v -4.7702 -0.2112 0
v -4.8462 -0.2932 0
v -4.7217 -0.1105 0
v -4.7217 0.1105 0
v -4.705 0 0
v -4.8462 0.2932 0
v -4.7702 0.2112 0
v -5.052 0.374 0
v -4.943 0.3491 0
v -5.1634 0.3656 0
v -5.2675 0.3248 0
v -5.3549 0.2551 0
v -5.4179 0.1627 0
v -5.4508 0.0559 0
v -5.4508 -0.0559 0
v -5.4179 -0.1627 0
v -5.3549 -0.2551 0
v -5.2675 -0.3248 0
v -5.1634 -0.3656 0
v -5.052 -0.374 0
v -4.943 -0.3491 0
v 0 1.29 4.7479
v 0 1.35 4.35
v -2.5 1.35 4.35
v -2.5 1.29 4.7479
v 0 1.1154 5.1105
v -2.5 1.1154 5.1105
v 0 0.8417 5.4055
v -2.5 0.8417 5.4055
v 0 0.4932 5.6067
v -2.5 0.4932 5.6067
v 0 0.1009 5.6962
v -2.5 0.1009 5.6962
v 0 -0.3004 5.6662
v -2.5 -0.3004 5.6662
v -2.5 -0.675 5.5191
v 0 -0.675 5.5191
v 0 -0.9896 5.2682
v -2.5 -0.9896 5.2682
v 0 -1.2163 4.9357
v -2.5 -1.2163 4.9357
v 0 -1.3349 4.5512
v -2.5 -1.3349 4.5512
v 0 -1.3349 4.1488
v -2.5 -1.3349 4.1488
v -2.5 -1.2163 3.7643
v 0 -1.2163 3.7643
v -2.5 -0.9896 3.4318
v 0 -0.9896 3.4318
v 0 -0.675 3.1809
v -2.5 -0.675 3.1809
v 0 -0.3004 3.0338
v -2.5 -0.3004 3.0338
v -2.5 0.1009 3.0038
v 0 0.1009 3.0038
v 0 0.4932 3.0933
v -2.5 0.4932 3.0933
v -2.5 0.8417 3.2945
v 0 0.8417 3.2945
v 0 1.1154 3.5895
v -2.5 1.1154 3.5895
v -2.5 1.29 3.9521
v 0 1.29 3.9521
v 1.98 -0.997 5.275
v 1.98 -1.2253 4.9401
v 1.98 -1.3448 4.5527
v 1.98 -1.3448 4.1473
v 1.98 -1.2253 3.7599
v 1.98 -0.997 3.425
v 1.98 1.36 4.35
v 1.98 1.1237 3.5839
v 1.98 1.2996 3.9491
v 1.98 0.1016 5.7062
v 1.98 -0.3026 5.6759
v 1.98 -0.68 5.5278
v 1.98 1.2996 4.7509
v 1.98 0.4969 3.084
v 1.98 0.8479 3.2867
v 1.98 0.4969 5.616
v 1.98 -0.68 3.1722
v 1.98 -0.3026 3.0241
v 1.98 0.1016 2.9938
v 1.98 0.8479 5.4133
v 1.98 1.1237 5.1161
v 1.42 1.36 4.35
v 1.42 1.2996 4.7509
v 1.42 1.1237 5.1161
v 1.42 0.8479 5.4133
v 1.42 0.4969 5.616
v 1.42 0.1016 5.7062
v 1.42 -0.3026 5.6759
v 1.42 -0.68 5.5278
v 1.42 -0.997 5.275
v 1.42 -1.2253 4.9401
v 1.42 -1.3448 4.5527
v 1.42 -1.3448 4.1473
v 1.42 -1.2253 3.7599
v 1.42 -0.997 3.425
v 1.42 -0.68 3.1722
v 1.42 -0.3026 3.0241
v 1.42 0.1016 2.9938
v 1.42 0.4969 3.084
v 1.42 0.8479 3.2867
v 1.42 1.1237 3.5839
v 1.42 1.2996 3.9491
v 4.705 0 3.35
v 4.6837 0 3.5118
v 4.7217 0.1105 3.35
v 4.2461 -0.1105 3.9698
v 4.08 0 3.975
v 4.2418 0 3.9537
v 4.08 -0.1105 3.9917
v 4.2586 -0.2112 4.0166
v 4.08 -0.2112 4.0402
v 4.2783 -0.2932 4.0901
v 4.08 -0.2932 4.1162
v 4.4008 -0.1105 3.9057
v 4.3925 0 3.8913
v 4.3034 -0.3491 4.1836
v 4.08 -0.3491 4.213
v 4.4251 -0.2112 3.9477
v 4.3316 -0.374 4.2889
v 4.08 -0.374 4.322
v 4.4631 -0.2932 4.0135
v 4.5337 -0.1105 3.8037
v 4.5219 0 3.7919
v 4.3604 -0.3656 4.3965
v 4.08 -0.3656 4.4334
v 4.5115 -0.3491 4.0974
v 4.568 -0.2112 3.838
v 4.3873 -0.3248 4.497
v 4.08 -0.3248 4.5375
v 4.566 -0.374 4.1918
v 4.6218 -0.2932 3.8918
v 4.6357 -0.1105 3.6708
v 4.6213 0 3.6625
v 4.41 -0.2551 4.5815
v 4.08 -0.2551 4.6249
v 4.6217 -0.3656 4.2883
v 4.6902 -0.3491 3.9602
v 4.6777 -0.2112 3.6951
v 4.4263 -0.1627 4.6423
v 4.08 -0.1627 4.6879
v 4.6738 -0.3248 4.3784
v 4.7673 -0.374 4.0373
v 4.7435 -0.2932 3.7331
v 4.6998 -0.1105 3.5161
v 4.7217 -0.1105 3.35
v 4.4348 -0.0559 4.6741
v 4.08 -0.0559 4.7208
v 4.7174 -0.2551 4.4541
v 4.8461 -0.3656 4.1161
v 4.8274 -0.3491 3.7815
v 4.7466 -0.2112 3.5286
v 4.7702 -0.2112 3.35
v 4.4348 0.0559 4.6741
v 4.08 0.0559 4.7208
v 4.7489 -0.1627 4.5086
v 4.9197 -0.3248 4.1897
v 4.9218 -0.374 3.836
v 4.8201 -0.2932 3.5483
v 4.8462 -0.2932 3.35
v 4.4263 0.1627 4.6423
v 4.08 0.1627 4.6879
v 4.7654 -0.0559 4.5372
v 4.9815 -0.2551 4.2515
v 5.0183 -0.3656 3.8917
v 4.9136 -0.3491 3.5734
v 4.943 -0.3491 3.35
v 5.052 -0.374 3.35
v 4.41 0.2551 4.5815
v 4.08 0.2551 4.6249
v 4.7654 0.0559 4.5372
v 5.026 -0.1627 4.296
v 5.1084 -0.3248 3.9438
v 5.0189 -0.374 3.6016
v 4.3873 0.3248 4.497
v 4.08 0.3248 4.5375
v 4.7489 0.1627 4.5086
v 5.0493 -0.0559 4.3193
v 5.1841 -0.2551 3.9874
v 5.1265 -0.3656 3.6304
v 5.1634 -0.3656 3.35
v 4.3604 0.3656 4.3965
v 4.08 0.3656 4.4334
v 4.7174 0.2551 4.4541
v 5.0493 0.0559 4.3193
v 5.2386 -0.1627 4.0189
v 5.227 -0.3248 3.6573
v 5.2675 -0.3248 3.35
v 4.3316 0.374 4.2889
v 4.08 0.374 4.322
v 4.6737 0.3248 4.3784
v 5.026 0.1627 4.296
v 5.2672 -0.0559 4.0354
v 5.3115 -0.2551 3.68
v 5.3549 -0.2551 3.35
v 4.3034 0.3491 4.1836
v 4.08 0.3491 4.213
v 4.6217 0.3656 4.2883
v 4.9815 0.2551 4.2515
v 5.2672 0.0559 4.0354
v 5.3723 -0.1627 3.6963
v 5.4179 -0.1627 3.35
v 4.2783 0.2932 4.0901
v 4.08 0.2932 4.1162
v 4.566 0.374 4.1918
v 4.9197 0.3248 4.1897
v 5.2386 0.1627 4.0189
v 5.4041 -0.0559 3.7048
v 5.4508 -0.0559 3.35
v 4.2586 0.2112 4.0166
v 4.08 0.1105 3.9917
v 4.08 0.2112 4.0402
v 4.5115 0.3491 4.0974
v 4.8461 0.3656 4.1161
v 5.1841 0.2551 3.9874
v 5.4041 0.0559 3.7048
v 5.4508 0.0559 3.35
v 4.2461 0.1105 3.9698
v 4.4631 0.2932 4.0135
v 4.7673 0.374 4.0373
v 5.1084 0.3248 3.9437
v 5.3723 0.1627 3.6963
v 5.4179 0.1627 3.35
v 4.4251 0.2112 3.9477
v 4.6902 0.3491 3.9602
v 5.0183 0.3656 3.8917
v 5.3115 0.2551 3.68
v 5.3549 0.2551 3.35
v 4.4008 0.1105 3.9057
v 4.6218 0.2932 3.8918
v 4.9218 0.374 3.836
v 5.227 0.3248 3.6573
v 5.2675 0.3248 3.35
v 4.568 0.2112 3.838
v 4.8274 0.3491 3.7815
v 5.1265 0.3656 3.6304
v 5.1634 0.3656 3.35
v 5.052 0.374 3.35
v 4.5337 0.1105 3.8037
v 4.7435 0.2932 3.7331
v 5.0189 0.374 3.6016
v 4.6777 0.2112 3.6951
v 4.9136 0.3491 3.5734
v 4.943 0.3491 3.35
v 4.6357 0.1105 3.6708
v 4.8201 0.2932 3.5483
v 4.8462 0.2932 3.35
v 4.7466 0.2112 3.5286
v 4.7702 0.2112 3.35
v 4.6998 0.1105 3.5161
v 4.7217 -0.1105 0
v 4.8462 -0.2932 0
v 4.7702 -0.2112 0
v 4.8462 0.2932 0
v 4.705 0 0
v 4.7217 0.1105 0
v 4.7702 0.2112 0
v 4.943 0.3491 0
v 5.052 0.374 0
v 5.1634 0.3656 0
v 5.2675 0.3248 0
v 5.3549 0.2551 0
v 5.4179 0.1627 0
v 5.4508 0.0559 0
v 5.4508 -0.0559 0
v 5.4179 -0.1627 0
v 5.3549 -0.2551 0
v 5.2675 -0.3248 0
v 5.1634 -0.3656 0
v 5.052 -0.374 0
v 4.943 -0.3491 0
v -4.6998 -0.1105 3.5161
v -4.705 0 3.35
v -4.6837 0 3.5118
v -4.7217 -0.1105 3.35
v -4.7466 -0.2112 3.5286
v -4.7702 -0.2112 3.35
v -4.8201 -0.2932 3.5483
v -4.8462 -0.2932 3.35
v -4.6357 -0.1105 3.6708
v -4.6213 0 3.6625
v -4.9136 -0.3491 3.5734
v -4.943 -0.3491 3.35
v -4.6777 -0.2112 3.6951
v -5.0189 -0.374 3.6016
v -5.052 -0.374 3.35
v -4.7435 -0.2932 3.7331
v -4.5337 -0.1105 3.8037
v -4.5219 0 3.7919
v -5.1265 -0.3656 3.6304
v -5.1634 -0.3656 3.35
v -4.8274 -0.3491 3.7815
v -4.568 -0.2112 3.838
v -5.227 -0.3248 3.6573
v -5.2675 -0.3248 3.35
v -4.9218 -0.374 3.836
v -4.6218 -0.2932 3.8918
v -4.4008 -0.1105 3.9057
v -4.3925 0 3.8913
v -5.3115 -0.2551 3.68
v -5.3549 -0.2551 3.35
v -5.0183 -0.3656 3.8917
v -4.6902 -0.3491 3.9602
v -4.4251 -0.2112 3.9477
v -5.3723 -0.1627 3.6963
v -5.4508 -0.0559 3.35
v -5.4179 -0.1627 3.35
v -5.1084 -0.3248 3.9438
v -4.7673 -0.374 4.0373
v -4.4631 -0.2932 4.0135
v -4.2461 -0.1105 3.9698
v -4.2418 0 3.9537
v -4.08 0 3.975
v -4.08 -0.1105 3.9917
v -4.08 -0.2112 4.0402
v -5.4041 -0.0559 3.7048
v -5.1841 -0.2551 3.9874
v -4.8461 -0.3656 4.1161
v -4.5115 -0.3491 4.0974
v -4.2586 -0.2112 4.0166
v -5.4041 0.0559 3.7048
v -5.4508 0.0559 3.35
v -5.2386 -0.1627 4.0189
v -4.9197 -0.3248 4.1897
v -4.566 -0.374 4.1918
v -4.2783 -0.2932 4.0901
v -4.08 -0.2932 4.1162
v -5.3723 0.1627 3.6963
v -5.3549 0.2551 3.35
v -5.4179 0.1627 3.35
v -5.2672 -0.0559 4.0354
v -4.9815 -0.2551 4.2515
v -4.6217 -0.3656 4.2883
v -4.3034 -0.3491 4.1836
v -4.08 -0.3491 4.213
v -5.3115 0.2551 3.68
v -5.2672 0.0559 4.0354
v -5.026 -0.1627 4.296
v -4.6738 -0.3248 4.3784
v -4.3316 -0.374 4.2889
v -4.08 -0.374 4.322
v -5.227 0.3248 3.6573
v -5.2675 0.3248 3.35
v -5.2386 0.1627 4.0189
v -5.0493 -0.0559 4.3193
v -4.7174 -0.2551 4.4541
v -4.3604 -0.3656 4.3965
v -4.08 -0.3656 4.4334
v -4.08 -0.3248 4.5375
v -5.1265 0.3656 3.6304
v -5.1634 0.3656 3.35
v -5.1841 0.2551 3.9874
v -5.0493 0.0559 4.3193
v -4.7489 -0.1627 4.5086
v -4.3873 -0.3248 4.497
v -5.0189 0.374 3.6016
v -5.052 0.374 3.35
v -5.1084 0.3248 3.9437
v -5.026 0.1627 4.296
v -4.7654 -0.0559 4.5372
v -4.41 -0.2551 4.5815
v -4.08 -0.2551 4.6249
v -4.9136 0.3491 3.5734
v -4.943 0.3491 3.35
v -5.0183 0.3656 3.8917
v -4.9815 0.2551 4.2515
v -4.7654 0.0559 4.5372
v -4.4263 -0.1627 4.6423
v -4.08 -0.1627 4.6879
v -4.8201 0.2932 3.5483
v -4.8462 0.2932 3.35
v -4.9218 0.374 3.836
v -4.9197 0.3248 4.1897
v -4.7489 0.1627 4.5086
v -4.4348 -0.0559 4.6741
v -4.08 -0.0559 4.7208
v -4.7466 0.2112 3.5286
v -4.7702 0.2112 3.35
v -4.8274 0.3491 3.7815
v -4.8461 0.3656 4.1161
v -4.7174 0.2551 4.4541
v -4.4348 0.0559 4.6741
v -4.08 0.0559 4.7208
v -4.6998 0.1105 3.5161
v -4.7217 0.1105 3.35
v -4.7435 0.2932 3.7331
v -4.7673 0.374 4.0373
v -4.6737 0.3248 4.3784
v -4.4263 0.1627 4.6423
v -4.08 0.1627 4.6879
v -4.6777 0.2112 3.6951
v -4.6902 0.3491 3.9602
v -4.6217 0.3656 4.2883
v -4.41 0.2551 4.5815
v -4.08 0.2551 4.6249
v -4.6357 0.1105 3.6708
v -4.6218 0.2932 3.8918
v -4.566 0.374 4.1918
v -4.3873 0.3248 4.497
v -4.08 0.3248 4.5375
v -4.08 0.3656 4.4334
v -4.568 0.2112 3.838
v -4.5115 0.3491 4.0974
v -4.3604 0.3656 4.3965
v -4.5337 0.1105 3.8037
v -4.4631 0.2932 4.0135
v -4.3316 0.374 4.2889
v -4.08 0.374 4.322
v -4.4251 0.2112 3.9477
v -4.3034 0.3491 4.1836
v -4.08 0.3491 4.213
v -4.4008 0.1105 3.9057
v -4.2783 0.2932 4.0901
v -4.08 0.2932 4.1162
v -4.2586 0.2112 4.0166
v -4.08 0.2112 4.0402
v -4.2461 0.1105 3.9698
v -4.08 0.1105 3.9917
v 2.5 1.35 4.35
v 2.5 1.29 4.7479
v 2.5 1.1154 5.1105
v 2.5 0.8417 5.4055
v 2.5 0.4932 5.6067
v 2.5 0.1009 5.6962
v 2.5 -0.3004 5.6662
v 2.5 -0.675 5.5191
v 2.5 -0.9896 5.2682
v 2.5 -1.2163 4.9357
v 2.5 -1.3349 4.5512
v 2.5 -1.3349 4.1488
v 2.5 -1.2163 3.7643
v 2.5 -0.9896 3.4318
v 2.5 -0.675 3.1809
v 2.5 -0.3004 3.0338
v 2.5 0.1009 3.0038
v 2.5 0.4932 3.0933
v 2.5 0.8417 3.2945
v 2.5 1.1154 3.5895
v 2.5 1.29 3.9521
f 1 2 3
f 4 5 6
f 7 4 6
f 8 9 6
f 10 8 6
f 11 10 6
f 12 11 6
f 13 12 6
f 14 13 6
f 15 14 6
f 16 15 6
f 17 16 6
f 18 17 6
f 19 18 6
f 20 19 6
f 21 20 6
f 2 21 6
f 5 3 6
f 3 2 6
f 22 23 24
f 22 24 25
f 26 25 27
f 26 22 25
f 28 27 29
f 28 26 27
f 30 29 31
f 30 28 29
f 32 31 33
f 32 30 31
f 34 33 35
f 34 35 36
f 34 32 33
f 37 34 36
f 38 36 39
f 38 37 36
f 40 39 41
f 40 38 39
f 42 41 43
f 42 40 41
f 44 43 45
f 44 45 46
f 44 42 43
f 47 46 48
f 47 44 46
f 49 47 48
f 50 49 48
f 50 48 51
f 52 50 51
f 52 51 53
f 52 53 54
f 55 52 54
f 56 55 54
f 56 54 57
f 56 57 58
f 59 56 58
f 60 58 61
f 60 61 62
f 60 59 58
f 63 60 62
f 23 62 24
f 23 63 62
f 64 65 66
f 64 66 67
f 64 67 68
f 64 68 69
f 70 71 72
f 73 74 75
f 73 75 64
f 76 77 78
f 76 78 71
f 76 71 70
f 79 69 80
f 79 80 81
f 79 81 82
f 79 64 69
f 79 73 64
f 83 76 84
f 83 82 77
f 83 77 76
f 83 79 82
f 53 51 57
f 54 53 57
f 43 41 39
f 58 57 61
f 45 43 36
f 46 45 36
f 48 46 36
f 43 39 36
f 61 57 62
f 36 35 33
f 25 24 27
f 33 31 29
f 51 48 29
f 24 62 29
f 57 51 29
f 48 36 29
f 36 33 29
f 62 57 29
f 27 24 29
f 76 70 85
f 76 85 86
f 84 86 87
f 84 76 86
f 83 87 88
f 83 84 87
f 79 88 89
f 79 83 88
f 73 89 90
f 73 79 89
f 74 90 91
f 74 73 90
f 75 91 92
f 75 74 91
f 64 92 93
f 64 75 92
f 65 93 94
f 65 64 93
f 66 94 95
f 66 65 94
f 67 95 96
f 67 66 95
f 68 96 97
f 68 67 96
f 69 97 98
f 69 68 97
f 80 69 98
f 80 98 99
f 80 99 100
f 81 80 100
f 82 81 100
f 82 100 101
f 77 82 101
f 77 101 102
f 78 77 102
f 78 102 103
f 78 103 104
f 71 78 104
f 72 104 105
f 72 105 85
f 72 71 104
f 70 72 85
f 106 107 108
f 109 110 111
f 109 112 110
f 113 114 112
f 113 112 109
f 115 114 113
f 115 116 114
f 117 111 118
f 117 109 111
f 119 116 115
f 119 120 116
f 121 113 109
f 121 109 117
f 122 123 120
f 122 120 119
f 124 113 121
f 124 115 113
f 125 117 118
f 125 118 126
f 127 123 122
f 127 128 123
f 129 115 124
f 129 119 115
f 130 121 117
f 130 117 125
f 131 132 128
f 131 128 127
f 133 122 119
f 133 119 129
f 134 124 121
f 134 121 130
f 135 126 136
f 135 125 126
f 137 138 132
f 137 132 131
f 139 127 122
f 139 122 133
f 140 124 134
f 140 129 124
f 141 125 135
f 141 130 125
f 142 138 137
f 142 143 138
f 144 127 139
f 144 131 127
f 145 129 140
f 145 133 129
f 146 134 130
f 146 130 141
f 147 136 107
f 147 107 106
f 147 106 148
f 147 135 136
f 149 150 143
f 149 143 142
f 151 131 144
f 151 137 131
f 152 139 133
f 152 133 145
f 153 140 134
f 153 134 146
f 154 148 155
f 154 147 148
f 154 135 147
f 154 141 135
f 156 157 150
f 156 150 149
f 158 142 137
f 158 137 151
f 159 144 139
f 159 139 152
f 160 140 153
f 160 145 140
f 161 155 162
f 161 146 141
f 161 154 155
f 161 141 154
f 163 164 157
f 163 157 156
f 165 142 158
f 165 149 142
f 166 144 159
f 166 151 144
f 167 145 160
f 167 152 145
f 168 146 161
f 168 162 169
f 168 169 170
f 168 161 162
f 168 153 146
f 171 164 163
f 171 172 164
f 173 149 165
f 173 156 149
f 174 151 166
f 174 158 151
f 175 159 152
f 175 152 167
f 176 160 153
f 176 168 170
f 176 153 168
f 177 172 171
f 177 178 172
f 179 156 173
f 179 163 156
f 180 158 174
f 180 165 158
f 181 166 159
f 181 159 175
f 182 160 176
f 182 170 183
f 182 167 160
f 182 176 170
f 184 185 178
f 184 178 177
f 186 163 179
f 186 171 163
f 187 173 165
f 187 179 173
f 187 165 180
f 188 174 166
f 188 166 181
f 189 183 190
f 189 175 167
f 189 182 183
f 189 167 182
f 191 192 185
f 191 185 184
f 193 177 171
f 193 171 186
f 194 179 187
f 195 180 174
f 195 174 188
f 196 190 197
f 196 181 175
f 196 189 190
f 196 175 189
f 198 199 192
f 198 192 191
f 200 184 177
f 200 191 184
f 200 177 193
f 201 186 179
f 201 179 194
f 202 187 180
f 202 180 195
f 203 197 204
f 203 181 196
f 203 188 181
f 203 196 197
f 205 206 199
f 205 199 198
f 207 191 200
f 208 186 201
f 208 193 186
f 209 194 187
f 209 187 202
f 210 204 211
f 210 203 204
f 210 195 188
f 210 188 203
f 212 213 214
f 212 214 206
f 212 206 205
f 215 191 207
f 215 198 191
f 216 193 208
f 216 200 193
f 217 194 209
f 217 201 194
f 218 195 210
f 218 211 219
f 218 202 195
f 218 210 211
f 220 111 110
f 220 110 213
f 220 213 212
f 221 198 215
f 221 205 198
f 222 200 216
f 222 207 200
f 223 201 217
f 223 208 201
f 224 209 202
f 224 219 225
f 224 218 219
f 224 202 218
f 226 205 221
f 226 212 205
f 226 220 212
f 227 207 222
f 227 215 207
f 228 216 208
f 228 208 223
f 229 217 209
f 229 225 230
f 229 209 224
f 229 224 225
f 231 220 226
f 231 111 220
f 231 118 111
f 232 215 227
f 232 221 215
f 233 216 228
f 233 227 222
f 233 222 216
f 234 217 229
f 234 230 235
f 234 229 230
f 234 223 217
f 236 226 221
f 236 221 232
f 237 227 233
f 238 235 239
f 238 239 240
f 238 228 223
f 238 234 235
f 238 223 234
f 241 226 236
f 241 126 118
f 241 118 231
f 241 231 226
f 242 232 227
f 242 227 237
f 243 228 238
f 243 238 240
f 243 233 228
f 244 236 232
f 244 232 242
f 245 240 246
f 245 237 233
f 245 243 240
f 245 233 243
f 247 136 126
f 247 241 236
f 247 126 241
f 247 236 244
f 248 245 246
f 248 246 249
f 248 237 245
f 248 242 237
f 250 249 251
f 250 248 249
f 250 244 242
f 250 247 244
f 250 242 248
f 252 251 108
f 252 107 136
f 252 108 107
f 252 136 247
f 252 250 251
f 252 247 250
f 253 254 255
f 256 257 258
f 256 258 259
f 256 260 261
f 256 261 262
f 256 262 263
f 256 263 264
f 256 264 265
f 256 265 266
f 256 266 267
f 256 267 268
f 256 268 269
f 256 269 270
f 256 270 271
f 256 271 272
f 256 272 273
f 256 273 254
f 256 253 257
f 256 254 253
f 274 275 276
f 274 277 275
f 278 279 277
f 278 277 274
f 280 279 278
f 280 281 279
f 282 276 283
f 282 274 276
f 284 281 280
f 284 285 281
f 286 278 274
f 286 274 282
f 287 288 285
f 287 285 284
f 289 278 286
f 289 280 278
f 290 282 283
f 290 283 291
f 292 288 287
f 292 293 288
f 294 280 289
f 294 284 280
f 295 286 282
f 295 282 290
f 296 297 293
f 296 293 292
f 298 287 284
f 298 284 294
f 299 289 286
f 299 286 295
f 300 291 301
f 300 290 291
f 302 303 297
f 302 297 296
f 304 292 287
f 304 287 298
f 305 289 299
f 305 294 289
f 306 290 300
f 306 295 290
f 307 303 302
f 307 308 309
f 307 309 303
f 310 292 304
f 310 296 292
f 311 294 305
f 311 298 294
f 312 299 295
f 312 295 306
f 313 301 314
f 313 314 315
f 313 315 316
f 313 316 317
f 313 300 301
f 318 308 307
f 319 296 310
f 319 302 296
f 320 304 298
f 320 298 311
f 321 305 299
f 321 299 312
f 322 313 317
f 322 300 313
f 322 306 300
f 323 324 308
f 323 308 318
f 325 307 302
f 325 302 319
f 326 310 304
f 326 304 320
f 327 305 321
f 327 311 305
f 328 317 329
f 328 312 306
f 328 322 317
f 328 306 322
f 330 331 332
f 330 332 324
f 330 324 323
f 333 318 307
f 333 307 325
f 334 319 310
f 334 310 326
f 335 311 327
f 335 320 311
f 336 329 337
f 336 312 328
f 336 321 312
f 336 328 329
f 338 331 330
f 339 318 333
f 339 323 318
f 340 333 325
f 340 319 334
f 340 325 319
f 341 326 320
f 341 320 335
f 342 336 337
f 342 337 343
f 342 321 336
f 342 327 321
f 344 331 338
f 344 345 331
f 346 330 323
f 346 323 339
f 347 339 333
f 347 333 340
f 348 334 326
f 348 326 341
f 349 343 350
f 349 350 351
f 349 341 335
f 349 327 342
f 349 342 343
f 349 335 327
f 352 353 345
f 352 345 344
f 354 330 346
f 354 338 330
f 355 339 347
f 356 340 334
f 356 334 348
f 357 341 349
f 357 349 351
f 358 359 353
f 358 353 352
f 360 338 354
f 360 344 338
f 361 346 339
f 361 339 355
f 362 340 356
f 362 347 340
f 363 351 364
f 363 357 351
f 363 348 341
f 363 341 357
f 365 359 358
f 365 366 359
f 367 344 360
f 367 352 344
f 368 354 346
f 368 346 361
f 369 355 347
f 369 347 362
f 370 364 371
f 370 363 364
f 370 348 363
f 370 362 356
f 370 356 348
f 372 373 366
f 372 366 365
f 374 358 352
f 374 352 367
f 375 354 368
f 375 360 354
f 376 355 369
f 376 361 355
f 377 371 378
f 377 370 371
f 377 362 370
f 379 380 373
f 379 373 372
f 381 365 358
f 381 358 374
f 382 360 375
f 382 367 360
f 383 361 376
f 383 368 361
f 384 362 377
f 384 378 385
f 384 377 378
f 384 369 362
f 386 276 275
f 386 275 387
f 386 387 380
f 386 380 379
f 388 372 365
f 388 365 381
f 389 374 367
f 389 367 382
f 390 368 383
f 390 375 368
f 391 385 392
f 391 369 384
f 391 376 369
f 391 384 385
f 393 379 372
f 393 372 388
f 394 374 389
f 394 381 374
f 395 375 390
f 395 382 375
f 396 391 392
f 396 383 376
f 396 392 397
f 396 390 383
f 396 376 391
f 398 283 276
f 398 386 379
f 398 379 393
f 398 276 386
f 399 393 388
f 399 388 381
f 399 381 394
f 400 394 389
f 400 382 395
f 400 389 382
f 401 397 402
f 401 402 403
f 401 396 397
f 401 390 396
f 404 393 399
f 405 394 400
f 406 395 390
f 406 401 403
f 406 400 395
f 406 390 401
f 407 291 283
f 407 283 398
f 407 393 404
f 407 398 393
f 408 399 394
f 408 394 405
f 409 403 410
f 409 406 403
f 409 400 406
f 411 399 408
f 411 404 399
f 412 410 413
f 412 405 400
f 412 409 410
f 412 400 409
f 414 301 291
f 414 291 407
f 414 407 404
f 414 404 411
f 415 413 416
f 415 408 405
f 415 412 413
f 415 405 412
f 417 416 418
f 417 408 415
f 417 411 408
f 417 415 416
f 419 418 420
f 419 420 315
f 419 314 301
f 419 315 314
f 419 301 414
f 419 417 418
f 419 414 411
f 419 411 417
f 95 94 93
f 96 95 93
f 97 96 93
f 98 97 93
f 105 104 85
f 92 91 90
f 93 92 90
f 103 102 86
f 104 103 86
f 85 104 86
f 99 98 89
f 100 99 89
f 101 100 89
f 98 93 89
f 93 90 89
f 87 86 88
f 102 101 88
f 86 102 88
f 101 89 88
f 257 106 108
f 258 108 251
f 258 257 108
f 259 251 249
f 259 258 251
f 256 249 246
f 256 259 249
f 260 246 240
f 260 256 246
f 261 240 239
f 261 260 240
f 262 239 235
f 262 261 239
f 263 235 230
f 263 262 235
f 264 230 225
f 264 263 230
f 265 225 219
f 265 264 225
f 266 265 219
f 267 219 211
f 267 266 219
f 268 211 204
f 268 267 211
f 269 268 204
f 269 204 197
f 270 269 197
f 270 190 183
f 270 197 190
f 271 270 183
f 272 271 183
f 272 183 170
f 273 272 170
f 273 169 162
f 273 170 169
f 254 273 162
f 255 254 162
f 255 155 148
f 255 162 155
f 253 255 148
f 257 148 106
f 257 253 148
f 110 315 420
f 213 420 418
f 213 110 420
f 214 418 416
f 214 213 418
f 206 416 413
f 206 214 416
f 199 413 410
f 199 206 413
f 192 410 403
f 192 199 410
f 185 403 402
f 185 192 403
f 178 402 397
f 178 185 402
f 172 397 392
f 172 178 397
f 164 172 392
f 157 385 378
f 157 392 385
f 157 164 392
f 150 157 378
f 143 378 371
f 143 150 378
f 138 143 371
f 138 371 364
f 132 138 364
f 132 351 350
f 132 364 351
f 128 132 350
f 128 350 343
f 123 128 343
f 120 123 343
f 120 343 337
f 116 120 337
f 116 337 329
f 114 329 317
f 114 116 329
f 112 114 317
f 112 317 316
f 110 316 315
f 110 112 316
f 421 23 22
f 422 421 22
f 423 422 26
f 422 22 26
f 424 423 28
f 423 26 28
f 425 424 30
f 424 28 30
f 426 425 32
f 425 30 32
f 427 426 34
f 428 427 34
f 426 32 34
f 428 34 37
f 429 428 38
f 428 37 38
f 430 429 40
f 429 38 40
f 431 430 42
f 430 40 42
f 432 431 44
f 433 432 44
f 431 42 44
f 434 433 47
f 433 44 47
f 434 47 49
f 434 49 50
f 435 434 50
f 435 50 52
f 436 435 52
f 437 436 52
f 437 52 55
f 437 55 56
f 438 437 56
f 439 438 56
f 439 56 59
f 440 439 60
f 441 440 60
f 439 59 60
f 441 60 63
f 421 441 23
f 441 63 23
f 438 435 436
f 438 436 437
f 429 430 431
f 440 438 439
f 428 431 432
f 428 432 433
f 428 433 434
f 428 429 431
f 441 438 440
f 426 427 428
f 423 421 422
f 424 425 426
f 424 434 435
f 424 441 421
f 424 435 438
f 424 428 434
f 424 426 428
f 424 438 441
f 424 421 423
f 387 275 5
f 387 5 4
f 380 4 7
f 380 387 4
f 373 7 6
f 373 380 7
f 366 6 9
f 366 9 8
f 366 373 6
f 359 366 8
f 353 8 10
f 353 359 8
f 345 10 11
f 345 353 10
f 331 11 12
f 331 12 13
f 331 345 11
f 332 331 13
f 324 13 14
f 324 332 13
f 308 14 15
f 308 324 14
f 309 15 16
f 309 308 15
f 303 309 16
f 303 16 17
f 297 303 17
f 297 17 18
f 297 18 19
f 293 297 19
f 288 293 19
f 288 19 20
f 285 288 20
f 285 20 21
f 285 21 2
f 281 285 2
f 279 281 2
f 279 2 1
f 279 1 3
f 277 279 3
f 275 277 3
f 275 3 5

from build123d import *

# Parameters (mm, degrees)
F1_R          = 0.375
F3_R          = 1.35
F4_DEPTH      = 2.5
F4_DEPTH_BACK = 2.5
F6_START      = -0.52
F5_R          = 1.36
F6_DEPTH      = 0.56


with BuildPart() as f2:
    # F2: sweep along a path in F0
    with BuildLine(Plane.XZ) as f2_path:
        Line((-5.08, 0), (-5.08, 3.35))
        ThreePointArc((-5.08, 3.35), (-4.7871067812, 4.0571067812), (-4.08, 4.35))
        Line((-4.08, 4.35), (4.08, 4.35))
        ThreePointArc((4.08, 4.35), (4.7871067812, 4.0571067812), (5.08, 3.35))
        Line((5.08, 3.35), (5.08, 0))
    # F1 (on Top) → F2 (sweep)
    with BuildSketch(Plane.XY):
        with Locations((-5.08, 0)):
            Circle(F1_R)
    sweep(path=f2_path.line)


with BuildPart() as f4:
    # F3 (on Right) → F4 (new body, two sides)
    with BuildSketch(Plane.YZ) as f4_sk:
        with Locations((0, 4.35)):
            Circle(F3_R)
    extrude(amount=-F4_DEPTH)
    extrude(f4_sk.sketch, amount=F4_DEPTH_BACK)


with BuildPart() as f6:
    # F5 (on face) → F6 (new body)
    with BuildSketch(Plane.YZ.offset(2.5).offset(F6_START)):
        with Locations((0, 4.35)):
            Circle(F5_R)
    extrude(amount=-F6_DEPTH)


solid = Compound([f2.part, f4.part, f6.part])
